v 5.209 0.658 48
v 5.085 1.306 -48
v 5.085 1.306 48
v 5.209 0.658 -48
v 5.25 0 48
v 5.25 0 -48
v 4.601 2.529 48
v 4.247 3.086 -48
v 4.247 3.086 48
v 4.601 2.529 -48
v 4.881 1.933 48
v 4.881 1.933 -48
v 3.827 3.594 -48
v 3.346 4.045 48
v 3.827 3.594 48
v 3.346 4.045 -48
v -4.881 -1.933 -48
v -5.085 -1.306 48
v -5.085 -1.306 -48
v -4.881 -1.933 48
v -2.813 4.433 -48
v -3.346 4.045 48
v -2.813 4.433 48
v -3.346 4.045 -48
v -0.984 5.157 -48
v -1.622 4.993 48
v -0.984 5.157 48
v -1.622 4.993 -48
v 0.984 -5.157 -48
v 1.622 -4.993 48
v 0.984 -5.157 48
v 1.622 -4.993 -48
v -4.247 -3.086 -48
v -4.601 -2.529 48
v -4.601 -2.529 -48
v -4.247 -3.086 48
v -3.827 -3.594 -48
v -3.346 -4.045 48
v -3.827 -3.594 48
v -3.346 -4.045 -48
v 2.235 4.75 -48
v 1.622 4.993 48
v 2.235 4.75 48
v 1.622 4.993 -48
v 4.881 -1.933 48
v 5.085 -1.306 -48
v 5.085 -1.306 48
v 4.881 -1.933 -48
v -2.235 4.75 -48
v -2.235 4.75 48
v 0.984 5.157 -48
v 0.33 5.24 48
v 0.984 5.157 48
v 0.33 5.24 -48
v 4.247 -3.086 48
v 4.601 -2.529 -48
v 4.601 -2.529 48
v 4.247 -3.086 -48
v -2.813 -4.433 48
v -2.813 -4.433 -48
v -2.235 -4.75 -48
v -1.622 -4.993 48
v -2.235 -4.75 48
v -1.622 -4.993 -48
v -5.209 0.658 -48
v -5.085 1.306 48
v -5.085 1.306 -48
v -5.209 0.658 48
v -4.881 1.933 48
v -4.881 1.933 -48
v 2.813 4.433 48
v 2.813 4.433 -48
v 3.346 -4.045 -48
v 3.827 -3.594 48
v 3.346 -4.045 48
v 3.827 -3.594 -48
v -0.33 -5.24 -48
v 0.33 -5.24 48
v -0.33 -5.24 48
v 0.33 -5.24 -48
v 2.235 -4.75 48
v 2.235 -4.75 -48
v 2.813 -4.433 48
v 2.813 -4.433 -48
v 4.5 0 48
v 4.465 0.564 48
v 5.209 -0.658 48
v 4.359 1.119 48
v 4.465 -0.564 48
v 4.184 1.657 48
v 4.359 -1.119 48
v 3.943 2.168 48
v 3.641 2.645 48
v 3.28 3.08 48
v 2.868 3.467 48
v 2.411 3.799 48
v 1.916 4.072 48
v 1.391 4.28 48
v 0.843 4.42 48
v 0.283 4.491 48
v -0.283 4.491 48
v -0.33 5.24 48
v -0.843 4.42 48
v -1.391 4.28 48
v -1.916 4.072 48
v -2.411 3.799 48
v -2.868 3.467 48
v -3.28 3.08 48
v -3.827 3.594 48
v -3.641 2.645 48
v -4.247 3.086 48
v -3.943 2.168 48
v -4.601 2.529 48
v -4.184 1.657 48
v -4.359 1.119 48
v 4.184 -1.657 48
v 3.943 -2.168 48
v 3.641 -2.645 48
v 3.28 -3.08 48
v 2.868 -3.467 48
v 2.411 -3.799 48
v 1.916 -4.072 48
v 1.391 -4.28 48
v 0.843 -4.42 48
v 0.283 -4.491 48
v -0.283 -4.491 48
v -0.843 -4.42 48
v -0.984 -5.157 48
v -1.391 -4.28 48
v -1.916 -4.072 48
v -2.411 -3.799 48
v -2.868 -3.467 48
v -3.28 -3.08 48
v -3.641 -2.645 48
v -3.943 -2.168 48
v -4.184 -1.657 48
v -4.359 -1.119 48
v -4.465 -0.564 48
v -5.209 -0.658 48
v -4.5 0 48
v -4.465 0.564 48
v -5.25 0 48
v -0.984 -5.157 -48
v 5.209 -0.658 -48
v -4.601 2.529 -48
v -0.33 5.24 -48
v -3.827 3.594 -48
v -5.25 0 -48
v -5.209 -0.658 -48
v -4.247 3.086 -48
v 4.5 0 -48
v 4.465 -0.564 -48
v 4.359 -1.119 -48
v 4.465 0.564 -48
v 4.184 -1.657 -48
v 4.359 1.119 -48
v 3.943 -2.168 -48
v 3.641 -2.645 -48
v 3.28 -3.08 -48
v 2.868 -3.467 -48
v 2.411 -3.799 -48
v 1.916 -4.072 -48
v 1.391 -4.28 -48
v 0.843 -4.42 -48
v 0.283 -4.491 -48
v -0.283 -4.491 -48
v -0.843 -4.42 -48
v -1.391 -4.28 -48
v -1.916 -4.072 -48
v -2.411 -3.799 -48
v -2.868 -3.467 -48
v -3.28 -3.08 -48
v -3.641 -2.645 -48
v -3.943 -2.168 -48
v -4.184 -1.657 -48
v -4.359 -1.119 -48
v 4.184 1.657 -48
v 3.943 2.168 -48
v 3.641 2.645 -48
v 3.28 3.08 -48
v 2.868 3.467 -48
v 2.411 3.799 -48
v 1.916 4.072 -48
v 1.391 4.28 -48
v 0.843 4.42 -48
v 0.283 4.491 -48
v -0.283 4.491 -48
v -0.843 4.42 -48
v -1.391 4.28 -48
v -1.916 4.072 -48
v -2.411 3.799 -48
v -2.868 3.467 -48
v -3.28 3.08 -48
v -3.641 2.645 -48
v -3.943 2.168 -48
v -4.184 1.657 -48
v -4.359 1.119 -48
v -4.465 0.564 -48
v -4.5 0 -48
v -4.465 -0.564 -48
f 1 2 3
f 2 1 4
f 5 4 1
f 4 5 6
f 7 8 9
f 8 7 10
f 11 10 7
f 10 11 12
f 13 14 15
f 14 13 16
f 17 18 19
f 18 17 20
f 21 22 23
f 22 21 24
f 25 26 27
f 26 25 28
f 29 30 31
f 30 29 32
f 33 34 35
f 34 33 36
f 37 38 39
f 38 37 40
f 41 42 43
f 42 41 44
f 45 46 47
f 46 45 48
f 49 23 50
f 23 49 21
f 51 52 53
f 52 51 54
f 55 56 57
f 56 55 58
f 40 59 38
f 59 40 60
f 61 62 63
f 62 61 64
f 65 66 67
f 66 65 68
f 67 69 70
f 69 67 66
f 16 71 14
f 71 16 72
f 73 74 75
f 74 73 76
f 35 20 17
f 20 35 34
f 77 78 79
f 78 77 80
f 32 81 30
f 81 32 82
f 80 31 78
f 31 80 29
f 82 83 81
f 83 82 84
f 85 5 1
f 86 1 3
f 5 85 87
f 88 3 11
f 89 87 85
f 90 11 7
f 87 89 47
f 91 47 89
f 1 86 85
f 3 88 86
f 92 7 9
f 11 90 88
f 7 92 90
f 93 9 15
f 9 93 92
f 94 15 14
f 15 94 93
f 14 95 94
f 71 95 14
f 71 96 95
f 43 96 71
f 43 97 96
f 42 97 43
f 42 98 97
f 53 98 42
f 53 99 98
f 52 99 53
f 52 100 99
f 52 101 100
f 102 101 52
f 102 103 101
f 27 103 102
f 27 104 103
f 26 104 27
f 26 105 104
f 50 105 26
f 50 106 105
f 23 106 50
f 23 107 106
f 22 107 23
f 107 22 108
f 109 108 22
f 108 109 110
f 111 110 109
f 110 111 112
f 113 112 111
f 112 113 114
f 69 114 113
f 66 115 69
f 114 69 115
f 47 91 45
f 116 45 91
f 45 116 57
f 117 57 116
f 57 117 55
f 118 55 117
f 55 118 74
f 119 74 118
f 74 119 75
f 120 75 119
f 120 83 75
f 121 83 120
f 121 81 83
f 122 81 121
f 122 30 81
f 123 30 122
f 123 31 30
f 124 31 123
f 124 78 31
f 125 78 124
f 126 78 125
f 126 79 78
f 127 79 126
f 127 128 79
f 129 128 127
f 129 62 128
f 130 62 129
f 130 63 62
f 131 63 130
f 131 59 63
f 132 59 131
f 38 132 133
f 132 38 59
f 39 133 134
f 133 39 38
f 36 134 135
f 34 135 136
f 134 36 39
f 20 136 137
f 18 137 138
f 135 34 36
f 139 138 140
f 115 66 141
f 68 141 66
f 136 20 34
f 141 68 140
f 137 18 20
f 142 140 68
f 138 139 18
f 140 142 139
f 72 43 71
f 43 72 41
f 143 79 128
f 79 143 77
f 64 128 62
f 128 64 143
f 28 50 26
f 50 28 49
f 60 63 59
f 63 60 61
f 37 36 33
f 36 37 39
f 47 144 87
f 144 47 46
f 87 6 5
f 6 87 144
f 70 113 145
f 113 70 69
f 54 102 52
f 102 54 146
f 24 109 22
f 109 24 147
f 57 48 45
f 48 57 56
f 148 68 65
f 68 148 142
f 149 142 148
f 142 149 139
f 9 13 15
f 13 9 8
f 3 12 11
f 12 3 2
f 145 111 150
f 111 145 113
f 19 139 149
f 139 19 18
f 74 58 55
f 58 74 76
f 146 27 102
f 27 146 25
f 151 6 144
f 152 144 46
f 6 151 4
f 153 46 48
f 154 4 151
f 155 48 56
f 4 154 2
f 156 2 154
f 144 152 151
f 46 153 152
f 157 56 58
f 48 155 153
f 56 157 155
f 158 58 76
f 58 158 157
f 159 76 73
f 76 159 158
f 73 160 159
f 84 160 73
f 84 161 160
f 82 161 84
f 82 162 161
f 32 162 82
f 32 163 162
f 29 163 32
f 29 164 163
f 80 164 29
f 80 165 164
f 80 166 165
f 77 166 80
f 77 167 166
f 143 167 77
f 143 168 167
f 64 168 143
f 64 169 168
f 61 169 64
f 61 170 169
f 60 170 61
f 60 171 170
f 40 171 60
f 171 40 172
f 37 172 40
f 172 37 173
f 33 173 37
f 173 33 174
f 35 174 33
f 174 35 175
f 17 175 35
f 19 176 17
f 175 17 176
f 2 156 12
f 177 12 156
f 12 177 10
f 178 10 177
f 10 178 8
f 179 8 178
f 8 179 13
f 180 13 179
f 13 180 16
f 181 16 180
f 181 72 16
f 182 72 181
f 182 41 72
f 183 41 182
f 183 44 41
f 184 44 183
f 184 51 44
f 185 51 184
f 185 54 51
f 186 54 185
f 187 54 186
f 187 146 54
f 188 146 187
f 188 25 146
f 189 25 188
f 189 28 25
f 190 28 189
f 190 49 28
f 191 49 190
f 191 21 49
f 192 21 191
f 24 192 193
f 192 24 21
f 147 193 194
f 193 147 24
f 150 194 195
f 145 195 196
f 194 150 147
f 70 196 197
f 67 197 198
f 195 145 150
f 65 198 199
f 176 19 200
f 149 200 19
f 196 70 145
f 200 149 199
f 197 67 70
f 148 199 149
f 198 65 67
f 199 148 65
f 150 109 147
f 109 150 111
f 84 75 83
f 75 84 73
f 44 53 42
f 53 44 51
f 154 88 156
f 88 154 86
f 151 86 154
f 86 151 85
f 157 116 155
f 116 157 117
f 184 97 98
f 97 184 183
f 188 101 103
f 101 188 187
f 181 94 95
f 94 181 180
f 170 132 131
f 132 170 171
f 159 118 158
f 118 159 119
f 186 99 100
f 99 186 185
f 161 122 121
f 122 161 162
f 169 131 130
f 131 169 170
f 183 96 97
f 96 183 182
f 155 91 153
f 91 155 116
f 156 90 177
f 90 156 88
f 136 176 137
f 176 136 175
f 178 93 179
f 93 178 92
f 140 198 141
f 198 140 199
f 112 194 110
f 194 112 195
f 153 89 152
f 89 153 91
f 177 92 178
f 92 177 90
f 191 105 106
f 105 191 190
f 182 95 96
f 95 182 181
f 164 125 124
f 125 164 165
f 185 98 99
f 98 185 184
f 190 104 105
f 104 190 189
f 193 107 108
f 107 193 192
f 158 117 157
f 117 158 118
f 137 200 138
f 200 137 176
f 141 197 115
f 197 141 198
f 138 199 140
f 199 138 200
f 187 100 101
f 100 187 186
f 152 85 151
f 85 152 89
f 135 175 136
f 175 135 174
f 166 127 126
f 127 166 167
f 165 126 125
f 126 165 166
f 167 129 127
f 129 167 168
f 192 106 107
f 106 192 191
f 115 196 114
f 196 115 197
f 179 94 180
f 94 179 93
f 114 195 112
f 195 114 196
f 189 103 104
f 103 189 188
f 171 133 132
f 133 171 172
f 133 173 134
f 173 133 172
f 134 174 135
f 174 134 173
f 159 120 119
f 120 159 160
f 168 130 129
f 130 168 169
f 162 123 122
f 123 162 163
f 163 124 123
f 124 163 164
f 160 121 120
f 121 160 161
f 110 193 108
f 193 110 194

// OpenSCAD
$fn = 50;


difference() {
	union() {
		translate(v = [0, 0, -48.0000000000]) {
			cylinder(h = 96, r = 5.2500000000);
		}
	}
	union() {
		translate(v = [0, 0, -100.0000000000]) {
			cylinder(h = 200, r = 4.5000000000);
		}
	}
}
